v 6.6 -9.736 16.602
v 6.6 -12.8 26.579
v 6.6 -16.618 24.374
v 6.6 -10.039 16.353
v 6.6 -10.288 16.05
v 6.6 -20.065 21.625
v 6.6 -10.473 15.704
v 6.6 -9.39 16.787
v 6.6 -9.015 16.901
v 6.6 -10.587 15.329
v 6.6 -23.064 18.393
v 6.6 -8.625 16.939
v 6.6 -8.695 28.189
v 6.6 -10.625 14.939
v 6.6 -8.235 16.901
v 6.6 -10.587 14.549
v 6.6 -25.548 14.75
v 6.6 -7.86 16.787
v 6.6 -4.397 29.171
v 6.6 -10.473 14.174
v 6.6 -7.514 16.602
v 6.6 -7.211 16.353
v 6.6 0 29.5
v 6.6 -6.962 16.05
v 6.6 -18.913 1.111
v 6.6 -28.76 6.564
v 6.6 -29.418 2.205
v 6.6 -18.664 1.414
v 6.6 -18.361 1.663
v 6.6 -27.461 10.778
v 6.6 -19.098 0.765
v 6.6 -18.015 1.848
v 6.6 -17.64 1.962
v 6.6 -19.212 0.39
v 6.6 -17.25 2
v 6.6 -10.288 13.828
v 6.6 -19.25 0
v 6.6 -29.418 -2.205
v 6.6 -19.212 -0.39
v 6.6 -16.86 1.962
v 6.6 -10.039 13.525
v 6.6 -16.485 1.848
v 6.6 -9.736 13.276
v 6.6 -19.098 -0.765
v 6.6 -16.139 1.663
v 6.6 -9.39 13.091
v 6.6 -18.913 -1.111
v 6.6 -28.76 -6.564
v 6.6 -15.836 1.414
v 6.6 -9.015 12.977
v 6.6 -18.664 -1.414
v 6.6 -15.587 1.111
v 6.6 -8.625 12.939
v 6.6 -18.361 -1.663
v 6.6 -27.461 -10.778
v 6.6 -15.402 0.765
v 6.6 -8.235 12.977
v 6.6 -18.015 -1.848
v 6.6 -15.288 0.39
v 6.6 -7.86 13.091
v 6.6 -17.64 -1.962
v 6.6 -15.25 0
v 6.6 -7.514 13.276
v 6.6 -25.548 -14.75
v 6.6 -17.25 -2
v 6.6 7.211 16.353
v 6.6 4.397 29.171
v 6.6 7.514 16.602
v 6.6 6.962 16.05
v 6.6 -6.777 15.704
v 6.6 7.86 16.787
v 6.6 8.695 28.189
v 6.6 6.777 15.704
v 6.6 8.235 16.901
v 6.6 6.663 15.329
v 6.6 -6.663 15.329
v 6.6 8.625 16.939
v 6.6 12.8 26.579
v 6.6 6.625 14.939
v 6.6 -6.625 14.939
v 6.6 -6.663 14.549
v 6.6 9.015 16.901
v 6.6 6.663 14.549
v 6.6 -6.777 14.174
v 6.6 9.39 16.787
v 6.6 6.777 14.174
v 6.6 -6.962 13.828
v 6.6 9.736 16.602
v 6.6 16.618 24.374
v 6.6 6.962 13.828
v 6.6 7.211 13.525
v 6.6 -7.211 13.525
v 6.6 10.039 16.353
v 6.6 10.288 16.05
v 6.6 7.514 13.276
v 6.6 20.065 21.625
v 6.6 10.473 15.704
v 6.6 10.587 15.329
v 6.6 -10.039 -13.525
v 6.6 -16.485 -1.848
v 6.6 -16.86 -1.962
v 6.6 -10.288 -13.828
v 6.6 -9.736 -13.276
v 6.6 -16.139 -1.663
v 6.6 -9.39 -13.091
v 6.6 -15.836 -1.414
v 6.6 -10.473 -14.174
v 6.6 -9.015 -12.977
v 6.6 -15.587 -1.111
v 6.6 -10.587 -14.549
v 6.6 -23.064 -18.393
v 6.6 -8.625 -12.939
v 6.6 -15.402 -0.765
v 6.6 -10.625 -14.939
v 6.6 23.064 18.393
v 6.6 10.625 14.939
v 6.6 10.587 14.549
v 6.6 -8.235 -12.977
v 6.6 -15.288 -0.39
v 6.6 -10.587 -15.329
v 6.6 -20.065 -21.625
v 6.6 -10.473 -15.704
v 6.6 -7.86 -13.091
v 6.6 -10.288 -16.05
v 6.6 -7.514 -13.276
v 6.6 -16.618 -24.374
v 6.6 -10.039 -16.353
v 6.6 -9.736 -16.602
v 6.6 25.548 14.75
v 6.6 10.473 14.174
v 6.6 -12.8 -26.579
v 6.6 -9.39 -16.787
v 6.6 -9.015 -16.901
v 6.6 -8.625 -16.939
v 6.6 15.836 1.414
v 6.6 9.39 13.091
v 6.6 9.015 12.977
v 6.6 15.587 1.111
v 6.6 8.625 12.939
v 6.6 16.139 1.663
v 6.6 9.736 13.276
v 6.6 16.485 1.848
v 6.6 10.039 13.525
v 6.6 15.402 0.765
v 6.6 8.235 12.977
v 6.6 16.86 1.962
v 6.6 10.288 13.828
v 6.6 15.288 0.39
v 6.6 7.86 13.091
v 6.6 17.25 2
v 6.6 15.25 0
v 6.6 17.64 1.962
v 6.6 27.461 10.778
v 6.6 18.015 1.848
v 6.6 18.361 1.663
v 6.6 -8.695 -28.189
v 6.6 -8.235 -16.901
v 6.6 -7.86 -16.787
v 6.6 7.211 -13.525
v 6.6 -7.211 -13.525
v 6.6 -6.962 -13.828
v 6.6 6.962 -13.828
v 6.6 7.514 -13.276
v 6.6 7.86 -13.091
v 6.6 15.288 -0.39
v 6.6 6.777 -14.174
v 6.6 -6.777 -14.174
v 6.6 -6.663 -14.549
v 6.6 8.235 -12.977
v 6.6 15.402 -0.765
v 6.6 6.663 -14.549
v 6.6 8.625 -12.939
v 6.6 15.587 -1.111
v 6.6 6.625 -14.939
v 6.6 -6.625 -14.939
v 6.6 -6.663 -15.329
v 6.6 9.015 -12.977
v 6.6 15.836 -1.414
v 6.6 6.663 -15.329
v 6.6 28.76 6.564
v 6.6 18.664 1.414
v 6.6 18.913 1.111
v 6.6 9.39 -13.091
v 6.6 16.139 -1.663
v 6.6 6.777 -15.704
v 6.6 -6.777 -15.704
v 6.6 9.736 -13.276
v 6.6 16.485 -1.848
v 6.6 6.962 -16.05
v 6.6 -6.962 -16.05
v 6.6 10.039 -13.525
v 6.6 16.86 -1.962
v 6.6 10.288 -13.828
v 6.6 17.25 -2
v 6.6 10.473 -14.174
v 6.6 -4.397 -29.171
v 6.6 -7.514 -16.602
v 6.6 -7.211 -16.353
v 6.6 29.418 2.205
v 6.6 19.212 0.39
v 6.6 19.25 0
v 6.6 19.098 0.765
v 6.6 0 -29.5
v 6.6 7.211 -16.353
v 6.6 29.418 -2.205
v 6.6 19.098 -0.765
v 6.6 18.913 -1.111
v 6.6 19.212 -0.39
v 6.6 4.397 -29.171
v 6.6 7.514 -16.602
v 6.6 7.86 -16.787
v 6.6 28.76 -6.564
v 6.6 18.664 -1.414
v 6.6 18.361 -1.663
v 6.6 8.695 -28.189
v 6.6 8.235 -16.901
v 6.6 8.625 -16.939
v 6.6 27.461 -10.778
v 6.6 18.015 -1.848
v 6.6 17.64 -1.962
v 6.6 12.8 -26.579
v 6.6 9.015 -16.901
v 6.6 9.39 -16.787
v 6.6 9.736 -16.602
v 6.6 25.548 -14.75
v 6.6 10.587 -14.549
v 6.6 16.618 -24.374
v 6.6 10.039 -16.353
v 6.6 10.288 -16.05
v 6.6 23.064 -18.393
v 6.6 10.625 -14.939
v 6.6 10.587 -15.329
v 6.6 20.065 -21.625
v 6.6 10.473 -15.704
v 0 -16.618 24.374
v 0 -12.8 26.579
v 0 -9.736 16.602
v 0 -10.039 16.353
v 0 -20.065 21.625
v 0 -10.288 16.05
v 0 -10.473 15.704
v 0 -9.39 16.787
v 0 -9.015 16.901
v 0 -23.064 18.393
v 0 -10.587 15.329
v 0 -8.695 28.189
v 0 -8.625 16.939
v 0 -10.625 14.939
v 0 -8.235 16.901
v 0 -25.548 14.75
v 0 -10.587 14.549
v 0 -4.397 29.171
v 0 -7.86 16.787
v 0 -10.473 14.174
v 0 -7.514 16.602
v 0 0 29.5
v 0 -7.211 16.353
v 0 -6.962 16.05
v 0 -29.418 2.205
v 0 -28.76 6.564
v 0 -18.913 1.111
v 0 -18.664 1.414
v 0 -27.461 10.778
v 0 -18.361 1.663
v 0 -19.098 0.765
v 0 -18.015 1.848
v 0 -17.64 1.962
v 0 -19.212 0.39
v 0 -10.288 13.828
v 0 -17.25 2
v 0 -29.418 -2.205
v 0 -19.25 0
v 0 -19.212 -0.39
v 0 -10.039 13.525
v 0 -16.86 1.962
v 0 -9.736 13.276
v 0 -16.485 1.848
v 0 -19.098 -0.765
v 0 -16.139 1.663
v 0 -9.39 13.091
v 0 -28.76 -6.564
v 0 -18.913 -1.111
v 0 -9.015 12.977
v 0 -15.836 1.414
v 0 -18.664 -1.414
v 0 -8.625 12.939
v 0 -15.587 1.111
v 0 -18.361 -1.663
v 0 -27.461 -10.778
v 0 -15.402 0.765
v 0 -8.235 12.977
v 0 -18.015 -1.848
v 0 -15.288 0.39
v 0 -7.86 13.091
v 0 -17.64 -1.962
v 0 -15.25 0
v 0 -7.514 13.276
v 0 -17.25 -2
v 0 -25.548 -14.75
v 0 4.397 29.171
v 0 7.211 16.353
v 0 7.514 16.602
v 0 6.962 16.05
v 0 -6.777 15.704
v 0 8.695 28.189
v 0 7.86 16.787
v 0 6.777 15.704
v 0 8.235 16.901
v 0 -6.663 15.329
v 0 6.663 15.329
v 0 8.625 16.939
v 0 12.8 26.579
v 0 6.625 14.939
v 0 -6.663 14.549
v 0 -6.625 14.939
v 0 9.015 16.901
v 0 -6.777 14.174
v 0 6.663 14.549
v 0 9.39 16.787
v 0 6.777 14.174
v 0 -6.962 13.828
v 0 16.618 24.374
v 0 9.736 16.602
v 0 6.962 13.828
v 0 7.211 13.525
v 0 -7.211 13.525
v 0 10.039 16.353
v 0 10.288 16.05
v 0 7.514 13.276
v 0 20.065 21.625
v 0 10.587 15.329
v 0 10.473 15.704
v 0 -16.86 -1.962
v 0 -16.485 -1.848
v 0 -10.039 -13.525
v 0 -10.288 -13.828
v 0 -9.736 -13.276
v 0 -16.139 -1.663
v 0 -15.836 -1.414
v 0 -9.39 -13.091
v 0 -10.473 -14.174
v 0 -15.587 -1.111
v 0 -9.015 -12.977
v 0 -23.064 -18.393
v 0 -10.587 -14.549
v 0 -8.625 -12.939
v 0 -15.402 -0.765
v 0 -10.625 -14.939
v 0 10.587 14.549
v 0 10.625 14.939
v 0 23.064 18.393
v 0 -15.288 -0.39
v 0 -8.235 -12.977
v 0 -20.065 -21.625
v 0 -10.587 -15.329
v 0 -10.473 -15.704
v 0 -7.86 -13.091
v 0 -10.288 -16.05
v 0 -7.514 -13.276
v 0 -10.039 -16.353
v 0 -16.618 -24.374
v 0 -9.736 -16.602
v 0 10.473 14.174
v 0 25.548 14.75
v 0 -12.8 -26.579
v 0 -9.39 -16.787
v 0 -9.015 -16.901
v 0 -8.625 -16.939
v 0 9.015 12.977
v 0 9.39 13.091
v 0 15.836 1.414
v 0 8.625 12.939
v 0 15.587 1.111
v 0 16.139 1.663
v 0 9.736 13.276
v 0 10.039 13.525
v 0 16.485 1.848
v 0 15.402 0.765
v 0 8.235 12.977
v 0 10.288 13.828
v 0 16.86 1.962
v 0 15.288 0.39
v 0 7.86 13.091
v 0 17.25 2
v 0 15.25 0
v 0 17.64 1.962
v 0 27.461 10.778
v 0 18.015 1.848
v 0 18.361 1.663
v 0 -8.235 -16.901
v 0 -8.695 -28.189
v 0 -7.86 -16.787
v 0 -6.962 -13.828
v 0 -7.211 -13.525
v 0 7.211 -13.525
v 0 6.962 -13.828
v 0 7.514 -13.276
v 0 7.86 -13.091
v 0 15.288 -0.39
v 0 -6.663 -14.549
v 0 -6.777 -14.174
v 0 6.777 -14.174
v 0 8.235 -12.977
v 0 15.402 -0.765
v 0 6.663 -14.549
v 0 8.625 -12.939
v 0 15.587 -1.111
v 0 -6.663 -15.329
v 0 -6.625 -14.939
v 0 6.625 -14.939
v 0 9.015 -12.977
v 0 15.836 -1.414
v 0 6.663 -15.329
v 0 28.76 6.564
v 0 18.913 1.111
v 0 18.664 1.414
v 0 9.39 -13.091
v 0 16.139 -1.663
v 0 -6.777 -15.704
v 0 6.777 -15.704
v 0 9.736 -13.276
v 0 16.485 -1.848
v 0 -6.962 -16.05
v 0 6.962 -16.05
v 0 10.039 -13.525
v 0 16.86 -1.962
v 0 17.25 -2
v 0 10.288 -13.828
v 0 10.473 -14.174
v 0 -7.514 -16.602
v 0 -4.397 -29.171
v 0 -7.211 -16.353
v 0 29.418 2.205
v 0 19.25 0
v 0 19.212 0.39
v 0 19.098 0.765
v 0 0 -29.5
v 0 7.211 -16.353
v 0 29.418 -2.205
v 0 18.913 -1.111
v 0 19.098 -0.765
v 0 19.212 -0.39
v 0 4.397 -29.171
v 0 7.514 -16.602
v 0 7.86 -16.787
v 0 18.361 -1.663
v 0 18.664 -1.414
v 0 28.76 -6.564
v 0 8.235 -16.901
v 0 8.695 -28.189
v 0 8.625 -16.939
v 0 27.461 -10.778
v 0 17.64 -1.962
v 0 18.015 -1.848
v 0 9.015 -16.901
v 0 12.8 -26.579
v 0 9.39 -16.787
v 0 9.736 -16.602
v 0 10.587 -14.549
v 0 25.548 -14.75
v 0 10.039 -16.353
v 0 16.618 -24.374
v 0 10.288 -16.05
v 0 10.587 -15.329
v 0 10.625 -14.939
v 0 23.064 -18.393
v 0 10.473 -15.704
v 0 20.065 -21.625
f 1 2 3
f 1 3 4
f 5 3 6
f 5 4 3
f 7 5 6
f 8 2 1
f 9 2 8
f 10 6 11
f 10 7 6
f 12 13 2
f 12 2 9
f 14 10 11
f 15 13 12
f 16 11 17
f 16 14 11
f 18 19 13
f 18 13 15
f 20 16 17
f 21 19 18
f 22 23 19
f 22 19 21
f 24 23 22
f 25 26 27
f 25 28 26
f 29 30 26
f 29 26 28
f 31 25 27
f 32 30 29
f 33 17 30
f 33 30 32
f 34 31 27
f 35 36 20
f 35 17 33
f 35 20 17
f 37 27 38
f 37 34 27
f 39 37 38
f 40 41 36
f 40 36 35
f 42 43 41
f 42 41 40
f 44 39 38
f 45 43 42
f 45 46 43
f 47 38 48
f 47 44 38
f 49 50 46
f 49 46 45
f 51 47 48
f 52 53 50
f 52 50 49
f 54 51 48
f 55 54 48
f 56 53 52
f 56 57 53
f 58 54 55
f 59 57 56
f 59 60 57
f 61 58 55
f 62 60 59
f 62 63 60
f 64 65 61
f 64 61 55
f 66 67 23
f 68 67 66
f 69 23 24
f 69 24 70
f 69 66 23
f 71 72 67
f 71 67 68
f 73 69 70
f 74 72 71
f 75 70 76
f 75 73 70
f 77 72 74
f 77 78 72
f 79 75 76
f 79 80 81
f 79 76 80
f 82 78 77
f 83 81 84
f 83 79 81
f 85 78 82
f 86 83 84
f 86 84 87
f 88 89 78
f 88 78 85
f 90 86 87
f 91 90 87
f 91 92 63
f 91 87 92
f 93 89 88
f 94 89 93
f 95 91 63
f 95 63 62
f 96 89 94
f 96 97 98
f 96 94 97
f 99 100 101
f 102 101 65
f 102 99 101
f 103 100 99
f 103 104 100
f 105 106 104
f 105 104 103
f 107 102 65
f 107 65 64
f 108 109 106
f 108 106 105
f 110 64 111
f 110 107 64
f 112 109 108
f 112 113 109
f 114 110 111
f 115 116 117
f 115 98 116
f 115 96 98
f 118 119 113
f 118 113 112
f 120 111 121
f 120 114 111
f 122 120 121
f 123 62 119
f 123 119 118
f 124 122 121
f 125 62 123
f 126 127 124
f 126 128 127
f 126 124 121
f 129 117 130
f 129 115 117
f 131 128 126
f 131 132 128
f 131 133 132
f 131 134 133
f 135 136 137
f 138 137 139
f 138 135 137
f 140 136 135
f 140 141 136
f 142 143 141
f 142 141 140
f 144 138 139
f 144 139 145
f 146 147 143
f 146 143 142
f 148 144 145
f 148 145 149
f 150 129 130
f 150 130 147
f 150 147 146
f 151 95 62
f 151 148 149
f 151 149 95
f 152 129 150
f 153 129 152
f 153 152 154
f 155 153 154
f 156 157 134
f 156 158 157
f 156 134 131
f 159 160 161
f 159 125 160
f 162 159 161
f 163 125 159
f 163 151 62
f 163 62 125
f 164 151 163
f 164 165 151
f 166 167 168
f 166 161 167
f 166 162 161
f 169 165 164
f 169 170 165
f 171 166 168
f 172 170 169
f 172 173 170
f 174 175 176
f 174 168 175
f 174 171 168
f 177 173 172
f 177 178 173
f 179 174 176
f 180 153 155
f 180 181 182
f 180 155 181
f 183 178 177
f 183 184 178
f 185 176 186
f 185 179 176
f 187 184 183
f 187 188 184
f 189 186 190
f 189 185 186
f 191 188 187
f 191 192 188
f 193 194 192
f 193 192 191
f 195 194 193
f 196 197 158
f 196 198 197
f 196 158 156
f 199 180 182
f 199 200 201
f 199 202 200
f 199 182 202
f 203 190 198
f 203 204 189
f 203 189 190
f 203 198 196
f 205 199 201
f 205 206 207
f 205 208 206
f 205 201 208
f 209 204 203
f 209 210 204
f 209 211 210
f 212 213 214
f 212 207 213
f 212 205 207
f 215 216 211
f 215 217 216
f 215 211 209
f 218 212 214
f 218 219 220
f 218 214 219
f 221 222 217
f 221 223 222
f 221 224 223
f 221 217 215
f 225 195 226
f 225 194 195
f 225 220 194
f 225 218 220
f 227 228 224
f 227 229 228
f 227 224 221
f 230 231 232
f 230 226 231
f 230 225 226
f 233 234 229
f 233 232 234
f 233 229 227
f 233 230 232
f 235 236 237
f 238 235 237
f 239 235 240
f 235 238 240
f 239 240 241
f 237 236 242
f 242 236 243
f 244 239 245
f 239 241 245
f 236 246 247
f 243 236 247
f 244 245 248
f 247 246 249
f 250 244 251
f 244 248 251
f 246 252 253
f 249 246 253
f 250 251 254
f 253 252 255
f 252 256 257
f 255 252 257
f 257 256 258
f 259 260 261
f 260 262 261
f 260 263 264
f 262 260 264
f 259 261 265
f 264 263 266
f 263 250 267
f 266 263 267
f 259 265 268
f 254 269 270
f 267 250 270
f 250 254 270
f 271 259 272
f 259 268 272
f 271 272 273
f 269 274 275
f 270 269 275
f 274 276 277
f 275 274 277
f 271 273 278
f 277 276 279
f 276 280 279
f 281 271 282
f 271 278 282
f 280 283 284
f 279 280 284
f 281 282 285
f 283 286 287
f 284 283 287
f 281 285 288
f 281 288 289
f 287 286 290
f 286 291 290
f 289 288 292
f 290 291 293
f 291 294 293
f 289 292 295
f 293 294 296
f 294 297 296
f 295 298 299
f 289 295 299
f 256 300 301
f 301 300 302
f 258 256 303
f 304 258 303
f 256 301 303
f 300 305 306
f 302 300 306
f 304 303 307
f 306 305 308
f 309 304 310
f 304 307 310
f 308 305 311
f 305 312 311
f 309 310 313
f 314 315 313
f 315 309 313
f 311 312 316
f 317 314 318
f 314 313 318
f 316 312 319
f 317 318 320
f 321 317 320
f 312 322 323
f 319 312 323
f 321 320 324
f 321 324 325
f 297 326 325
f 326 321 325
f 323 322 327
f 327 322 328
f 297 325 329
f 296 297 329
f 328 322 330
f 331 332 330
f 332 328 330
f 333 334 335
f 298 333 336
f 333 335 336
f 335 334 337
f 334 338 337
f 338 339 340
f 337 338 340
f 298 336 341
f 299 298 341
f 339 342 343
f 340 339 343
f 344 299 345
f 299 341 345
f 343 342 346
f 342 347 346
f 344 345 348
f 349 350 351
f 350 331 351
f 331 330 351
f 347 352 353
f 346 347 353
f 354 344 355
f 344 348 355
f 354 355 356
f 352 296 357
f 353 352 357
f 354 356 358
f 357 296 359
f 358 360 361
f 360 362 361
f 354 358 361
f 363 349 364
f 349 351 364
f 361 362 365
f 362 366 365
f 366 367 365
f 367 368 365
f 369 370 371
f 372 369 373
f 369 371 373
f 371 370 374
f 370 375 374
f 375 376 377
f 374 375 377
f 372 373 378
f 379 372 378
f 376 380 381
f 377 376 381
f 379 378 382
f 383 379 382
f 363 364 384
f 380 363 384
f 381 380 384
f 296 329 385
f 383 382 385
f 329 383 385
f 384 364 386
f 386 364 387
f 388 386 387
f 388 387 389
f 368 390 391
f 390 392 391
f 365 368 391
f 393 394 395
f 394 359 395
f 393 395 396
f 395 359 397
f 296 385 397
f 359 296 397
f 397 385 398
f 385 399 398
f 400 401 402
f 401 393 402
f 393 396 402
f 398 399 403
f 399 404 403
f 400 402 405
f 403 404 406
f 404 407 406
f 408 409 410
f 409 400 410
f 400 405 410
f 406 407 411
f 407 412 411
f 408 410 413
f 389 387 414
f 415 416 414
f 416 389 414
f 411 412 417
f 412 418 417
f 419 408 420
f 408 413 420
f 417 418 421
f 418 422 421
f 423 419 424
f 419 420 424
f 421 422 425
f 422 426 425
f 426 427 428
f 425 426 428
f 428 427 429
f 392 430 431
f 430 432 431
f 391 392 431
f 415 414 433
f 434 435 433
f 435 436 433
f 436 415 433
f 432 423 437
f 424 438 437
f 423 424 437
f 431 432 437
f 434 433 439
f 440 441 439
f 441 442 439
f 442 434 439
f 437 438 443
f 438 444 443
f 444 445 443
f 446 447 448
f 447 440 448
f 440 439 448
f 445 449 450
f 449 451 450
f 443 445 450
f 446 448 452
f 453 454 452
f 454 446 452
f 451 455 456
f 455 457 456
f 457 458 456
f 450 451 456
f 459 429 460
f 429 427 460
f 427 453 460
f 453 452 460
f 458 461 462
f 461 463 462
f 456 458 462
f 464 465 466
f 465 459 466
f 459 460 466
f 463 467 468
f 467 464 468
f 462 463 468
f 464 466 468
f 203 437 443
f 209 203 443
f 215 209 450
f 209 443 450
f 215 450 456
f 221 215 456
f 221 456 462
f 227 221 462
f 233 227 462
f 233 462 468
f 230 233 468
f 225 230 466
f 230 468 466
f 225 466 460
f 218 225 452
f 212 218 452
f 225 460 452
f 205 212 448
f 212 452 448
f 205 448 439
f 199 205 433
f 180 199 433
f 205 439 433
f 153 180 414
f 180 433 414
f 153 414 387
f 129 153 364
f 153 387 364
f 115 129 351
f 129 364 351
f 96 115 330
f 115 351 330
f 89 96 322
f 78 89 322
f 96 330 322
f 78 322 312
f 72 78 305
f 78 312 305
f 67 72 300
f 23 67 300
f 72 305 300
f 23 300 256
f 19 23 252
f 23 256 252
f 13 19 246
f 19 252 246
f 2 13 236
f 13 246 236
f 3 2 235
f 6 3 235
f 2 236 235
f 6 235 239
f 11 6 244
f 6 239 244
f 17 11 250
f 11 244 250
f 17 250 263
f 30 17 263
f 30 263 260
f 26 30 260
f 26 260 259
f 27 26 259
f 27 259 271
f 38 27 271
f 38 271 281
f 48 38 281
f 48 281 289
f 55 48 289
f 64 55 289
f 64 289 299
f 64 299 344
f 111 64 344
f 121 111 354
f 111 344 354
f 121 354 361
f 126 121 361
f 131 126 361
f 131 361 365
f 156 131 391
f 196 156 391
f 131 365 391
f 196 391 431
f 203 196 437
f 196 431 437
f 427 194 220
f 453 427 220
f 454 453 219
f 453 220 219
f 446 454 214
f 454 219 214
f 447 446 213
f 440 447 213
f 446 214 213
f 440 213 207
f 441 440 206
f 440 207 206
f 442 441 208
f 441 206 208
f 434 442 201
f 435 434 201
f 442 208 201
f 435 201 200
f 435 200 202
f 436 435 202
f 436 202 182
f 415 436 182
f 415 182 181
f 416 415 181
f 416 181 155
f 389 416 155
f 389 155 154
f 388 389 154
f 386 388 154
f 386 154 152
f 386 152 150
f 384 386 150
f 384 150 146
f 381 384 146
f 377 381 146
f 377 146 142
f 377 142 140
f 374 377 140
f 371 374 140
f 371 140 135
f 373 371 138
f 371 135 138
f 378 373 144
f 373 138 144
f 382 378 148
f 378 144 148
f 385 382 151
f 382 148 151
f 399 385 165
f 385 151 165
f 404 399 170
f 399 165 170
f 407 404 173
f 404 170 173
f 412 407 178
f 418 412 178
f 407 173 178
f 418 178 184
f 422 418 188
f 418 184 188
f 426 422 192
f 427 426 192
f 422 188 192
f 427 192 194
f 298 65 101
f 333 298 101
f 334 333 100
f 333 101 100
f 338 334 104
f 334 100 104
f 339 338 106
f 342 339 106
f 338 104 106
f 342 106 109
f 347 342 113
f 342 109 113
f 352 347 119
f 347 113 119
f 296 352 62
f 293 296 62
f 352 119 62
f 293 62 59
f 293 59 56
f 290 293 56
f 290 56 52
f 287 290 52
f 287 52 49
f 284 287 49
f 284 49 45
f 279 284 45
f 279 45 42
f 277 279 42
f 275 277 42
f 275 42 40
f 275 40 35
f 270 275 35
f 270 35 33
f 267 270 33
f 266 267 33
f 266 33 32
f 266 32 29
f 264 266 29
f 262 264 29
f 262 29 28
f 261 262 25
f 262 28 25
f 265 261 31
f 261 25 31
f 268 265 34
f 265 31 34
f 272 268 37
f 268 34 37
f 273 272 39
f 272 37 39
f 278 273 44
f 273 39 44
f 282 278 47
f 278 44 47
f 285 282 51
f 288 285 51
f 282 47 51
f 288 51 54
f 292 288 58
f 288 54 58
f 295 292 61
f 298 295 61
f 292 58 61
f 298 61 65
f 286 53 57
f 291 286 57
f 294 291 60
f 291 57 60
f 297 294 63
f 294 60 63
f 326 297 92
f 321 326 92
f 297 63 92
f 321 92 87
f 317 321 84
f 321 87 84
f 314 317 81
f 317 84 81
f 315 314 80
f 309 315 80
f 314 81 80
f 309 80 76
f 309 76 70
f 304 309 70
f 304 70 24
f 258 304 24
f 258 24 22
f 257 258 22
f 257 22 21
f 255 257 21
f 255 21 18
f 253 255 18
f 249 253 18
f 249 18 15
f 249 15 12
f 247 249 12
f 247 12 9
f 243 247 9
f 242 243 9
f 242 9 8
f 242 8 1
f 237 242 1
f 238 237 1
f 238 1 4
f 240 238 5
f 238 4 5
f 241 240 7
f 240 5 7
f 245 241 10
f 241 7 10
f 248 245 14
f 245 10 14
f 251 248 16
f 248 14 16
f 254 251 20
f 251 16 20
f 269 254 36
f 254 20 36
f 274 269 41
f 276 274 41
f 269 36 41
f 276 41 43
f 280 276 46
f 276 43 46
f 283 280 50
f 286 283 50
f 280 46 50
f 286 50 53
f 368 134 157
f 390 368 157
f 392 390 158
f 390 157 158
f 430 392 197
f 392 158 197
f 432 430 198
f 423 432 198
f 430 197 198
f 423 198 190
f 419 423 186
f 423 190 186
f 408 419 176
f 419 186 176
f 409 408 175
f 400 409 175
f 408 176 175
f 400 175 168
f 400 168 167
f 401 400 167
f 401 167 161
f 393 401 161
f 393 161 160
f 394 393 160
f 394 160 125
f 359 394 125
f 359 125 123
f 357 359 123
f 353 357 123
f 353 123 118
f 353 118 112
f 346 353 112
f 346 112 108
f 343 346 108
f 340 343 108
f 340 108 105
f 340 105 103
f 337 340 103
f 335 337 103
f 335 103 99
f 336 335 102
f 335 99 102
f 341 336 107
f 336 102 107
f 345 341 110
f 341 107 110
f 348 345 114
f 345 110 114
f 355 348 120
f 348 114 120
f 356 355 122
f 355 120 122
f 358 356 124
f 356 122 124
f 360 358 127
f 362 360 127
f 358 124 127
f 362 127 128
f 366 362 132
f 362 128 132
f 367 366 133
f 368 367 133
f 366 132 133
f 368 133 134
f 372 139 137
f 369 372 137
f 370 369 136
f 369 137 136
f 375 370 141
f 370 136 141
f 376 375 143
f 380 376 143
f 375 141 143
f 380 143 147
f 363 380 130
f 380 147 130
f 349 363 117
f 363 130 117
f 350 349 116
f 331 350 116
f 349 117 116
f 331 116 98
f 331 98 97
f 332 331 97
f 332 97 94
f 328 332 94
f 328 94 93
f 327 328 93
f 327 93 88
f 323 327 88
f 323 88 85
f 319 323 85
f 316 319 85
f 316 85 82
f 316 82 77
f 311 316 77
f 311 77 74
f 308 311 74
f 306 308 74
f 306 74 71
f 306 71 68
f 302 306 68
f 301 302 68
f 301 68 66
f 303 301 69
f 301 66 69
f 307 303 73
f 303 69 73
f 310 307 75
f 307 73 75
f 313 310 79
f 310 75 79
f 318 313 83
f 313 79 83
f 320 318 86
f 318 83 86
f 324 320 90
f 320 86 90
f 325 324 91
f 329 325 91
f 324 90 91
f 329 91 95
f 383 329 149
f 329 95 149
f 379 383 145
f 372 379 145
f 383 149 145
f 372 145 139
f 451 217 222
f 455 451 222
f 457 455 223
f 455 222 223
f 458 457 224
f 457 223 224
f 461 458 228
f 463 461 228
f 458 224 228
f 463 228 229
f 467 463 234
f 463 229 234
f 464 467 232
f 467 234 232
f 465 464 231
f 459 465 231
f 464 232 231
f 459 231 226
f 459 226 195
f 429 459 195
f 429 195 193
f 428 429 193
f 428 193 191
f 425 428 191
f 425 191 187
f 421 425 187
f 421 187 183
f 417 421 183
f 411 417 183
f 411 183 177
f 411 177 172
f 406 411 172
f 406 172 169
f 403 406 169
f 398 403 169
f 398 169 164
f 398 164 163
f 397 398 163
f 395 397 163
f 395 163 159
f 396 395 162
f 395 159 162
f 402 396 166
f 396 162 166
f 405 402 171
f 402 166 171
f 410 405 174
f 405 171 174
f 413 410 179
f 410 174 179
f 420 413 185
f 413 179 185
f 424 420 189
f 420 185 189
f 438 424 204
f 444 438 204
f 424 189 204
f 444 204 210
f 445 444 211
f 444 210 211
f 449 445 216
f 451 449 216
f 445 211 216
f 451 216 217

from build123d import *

# Parameters (mm, degrees)
SKETCH_1_R          = 29.5
EXTRUDE_1_DEPTH     = 6.6
SKETCH_2_R          = 2
CUT_EXTRUDE_1_DEPTH = 21


with BuildPart() as part:
    # 草图1 → 凸台-拉伸1 (new body)
    with BuildSketch(Plane(origin=(0, 0, 0), x_dir=(0, 0, -1), z_dir=(1, 0, 0))):
        Circle(SKETCH_1_R)
    extrude(amount=EXTRUDE_1_DEPTH)

    # 草图2 → 切除-拉伸1 (cut)
    with BuildSketch(Plane(origin=(6.6, 0, 0), x_dir=(0, 0, -1), z_dir=(1, 0, 0))):
        with Locations((0, 17.25)):
            Circle(SKETCH_2_R)
        with Locations((14.938938215, 8.625)):
            Circle(SKETCH_2_R)
        with Locations((14.938938215, -8.625)):
            Circle(SKETCH_2_R)
        with Locations((0, -17.25)):
            Circle(SKETCH_2_R)
        with Locations((-14.938938215, -8.625)):
            Circle(SKETCH_2_R)
        with Locations((-14.938938215, 8.625)):
            Circle(SKETCH_2_R)
    extrude(amount=-CUT_EXTRUDE_1_DEPTH, mode=Mode.SUBTRACT)


solid = part.part
